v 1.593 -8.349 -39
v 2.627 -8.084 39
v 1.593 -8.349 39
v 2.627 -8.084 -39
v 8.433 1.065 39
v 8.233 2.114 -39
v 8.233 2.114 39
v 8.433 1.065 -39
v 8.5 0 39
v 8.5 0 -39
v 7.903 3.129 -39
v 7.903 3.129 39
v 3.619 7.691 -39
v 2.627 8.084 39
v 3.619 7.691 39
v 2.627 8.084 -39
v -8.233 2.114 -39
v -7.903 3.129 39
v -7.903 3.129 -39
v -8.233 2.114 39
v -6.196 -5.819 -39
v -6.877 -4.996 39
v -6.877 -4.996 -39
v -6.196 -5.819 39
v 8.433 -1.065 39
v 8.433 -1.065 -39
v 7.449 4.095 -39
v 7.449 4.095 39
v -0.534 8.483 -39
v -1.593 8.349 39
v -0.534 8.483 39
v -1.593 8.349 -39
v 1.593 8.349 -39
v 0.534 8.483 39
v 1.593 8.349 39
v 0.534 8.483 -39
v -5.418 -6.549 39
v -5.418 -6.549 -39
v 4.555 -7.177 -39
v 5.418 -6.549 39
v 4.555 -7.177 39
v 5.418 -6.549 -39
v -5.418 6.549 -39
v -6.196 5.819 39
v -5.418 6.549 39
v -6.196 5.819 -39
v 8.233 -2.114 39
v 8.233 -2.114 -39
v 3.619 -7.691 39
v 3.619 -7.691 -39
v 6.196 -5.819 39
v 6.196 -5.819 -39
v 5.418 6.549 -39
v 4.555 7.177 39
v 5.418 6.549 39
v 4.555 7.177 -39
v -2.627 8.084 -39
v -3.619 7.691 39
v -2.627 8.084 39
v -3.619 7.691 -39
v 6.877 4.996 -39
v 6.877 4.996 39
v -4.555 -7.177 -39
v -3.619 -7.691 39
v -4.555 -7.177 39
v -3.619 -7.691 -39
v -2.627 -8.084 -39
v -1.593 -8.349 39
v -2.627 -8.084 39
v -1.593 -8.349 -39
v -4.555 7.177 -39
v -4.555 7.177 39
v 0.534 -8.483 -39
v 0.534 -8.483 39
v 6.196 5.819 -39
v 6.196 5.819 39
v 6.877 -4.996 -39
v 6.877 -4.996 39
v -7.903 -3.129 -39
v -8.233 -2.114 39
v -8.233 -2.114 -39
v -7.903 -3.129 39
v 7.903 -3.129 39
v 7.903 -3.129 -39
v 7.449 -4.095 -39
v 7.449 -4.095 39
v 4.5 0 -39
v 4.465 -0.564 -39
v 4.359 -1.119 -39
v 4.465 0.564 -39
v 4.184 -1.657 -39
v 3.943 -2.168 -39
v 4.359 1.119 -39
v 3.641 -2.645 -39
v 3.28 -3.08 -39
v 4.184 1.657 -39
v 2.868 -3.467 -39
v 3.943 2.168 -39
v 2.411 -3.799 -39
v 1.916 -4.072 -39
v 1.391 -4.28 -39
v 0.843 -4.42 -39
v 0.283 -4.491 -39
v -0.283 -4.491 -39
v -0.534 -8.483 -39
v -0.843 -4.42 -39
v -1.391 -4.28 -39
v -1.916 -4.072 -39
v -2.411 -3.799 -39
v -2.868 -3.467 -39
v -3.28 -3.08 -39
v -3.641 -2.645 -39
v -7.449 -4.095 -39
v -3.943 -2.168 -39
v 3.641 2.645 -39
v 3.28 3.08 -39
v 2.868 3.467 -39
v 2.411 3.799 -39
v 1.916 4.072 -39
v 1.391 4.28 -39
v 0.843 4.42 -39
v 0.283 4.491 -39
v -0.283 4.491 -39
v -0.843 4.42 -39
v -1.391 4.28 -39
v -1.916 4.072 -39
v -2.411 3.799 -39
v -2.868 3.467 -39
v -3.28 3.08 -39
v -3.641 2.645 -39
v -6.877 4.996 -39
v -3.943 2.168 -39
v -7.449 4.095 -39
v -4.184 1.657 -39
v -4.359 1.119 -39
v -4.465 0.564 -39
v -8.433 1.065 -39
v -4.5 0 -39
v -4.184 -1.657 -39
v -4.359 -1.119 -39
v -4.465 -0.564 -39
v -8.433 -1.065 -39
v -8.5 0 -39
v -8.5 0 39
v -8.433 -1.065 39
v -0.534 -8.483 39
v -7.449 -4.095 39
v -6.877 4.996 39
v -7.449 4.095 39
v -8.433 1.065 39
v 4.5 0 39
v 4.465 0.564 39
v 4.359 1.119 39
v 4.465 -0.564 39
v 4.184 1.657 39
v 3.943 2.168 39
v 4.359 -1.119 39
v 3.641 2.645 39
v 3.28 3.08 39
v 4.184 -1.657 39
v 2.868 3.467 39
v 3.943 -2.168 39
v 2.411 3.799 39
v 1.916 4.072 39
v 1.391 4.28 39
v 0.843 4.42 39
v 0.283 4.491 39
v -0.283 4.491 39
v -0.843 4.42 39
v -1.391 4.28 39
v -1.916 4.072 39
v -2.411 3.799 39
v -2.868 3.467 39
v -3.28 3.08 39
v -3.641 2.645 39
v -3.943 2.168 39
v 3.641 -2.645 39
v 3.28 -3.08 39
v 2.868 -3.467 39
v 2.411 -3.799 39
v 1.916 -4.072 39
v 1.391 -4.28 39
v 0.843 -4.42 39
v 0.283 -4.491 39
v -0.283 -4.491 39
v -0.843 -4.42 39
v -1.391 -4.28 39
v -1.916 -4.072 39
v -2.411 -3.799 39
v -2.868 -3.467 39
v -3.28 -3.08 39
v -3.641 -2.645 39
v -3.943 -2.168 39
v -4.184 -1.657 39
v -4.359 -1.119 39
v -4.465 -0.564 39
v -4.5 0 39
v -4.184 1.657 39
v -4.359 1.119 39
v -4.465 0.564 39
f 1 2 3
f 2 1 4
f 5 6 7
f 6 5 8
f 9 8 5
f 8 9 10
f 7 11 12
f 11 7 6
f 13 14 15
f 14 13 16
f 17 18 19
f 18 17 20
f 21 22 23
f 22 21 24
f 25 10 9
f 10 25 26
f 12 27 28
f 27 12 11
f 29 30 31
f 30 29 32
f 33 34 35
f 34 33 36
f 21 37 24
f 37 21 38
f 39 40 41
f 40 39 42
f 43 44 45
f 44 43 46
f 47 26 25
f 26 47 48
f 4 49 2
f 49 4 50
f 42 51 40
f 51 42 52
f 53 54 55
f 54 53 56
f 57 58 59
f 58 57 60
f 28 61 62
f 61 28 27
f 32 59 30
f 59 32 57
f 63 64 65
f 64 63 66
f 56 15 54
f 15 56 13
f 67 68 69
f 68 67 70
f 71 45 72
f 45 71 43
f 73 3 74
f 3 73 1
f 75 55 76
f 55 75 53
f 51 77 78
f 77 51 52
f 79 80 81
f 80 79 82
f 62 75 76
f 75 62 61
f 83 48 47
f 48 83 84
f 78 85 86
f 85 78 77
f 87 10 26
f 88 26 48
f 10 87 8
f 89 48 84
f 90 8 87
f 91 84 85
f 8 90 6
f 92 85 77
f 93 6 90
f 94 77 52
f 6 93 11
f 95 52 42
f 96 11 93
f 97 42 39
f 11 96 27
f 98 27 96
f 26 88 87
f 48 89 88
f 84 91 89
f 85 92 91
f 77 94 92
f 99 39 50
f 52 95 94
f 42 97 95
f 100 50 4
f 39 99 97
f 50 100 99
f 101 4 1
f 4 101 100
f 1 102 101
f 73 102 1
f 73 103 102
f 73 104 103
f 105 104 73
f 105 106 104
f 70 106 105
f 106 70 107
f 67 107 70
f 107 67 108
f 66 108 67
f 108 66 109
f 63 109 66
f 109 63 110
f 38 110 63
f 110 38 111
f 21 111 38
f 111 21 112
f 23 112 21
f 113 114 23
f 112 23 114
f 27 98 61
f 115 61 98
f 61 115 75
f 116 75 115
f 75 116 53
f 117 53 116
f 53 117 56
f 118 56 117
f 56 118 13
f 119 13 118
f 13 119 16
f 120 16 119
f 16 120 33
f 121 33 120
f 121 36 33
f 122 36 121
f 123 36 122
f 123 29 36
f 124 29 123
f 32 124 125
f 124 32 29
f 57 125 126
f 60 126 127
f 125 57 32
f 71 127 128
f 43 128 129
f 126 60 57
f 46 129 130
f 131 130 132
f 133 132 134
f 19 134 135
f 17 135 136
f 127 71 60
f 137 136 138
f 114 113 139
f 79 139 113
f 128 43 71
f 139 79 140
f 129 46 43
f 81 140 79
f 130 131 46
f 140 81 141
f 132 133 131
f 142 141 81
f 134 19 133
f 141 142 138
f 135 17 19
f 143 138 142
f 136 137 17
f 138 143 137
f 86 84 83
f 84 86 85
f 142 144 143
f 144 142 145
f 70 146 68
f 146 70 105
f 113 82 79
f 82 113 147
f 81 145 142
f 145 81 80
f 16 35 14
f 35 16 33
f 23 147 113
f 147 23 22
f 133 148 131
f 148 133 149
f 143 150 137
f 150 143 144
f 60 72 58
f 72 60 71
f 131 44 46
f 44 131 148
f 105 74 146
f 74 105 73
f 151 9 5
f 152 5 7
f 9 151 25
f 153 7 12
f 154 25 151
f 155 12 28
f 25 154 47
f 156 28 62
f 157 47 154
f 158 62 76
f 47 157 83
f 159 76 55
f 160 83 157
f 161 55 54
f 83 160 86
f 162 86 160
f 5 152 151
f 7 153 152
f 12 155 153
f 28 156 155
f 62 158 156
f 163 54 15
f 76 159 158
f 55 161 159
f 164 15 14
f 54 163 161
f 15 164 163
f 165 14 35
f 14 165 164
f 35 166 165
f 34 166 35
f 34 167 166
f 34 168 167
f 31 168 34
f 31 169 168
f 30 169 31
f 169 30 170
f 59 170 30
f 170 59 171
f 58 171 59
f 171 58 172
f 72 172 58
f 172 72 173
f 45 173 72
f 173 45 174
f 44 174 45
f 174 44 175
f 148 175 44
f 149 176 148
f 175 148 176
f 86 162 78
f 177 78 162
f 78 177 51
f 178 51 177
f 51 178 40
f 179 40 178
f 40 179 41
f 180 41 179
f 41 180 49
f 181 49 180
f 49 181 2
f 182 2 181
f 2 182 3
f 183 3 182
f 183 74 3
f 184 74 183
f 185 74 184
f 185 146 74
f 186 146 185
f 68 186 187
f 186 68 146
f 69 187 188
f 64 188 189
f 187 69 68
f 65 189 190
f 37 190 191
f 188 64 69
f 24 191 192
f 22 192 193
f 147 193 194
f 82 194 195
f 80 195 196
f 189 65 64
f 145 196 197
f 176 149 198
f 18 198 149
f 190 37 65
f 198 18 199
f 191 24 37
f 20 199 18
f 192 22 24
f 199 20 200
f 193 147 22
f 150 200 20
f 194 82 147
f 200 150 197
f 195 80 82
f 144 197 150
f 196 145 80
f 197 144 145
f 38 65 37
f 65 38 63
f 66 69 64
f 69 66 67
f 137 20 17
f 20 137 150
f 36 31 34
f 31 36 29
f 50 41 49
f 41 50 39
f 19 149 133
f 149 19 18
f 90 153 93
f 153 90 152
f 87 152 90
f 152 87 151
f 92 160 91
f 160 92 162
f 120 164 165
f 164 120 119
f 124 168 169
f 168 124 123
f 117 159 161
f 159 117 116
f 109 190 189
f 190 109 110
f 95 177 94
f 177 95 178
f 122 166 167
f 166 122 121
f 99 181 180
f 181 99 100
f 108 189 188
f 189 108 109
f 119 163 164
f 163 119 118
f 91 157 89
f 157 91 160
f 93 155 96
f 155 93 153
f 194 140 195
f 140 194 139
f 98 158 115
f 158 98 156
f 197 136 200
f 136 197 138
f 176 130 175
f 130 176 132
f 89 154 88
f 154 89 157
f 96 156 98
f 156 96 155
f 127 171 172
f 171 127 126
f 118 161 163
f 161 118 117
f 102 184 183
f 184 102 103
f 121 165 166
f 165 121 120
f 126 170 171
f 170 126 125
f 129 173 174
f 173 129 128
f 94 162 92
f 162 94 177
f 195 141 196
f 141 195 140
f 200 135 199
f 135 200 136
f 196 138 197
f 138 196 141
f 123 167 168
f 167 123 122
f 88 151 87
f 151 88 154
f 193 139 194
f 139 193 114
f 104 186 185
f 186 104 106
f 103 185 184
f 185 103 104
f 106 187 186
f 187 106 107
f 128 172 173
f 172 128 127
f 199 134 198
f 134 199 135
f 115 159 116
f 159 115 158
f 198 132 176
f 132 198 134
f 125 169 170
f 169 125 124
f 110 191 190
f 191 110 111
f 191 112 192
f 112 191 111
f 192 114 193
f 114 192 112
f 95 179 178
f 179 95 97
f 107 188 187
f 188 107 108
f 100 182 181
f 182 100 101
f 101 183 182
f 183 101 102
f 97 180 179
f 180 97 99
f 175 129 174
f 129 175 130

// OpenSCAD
$fn = 50;


difference() {
	union() {
		translate(v = [0, 0, -39.0000000000]) {
			cylinder(h = 78, r = 8.5000000000);
		}
	}
	union() {
		translate(v = [0, 0, -100.0000000000]) {
			cylinder(h = 200, r = 4.5000000000);
		}
	}
}
